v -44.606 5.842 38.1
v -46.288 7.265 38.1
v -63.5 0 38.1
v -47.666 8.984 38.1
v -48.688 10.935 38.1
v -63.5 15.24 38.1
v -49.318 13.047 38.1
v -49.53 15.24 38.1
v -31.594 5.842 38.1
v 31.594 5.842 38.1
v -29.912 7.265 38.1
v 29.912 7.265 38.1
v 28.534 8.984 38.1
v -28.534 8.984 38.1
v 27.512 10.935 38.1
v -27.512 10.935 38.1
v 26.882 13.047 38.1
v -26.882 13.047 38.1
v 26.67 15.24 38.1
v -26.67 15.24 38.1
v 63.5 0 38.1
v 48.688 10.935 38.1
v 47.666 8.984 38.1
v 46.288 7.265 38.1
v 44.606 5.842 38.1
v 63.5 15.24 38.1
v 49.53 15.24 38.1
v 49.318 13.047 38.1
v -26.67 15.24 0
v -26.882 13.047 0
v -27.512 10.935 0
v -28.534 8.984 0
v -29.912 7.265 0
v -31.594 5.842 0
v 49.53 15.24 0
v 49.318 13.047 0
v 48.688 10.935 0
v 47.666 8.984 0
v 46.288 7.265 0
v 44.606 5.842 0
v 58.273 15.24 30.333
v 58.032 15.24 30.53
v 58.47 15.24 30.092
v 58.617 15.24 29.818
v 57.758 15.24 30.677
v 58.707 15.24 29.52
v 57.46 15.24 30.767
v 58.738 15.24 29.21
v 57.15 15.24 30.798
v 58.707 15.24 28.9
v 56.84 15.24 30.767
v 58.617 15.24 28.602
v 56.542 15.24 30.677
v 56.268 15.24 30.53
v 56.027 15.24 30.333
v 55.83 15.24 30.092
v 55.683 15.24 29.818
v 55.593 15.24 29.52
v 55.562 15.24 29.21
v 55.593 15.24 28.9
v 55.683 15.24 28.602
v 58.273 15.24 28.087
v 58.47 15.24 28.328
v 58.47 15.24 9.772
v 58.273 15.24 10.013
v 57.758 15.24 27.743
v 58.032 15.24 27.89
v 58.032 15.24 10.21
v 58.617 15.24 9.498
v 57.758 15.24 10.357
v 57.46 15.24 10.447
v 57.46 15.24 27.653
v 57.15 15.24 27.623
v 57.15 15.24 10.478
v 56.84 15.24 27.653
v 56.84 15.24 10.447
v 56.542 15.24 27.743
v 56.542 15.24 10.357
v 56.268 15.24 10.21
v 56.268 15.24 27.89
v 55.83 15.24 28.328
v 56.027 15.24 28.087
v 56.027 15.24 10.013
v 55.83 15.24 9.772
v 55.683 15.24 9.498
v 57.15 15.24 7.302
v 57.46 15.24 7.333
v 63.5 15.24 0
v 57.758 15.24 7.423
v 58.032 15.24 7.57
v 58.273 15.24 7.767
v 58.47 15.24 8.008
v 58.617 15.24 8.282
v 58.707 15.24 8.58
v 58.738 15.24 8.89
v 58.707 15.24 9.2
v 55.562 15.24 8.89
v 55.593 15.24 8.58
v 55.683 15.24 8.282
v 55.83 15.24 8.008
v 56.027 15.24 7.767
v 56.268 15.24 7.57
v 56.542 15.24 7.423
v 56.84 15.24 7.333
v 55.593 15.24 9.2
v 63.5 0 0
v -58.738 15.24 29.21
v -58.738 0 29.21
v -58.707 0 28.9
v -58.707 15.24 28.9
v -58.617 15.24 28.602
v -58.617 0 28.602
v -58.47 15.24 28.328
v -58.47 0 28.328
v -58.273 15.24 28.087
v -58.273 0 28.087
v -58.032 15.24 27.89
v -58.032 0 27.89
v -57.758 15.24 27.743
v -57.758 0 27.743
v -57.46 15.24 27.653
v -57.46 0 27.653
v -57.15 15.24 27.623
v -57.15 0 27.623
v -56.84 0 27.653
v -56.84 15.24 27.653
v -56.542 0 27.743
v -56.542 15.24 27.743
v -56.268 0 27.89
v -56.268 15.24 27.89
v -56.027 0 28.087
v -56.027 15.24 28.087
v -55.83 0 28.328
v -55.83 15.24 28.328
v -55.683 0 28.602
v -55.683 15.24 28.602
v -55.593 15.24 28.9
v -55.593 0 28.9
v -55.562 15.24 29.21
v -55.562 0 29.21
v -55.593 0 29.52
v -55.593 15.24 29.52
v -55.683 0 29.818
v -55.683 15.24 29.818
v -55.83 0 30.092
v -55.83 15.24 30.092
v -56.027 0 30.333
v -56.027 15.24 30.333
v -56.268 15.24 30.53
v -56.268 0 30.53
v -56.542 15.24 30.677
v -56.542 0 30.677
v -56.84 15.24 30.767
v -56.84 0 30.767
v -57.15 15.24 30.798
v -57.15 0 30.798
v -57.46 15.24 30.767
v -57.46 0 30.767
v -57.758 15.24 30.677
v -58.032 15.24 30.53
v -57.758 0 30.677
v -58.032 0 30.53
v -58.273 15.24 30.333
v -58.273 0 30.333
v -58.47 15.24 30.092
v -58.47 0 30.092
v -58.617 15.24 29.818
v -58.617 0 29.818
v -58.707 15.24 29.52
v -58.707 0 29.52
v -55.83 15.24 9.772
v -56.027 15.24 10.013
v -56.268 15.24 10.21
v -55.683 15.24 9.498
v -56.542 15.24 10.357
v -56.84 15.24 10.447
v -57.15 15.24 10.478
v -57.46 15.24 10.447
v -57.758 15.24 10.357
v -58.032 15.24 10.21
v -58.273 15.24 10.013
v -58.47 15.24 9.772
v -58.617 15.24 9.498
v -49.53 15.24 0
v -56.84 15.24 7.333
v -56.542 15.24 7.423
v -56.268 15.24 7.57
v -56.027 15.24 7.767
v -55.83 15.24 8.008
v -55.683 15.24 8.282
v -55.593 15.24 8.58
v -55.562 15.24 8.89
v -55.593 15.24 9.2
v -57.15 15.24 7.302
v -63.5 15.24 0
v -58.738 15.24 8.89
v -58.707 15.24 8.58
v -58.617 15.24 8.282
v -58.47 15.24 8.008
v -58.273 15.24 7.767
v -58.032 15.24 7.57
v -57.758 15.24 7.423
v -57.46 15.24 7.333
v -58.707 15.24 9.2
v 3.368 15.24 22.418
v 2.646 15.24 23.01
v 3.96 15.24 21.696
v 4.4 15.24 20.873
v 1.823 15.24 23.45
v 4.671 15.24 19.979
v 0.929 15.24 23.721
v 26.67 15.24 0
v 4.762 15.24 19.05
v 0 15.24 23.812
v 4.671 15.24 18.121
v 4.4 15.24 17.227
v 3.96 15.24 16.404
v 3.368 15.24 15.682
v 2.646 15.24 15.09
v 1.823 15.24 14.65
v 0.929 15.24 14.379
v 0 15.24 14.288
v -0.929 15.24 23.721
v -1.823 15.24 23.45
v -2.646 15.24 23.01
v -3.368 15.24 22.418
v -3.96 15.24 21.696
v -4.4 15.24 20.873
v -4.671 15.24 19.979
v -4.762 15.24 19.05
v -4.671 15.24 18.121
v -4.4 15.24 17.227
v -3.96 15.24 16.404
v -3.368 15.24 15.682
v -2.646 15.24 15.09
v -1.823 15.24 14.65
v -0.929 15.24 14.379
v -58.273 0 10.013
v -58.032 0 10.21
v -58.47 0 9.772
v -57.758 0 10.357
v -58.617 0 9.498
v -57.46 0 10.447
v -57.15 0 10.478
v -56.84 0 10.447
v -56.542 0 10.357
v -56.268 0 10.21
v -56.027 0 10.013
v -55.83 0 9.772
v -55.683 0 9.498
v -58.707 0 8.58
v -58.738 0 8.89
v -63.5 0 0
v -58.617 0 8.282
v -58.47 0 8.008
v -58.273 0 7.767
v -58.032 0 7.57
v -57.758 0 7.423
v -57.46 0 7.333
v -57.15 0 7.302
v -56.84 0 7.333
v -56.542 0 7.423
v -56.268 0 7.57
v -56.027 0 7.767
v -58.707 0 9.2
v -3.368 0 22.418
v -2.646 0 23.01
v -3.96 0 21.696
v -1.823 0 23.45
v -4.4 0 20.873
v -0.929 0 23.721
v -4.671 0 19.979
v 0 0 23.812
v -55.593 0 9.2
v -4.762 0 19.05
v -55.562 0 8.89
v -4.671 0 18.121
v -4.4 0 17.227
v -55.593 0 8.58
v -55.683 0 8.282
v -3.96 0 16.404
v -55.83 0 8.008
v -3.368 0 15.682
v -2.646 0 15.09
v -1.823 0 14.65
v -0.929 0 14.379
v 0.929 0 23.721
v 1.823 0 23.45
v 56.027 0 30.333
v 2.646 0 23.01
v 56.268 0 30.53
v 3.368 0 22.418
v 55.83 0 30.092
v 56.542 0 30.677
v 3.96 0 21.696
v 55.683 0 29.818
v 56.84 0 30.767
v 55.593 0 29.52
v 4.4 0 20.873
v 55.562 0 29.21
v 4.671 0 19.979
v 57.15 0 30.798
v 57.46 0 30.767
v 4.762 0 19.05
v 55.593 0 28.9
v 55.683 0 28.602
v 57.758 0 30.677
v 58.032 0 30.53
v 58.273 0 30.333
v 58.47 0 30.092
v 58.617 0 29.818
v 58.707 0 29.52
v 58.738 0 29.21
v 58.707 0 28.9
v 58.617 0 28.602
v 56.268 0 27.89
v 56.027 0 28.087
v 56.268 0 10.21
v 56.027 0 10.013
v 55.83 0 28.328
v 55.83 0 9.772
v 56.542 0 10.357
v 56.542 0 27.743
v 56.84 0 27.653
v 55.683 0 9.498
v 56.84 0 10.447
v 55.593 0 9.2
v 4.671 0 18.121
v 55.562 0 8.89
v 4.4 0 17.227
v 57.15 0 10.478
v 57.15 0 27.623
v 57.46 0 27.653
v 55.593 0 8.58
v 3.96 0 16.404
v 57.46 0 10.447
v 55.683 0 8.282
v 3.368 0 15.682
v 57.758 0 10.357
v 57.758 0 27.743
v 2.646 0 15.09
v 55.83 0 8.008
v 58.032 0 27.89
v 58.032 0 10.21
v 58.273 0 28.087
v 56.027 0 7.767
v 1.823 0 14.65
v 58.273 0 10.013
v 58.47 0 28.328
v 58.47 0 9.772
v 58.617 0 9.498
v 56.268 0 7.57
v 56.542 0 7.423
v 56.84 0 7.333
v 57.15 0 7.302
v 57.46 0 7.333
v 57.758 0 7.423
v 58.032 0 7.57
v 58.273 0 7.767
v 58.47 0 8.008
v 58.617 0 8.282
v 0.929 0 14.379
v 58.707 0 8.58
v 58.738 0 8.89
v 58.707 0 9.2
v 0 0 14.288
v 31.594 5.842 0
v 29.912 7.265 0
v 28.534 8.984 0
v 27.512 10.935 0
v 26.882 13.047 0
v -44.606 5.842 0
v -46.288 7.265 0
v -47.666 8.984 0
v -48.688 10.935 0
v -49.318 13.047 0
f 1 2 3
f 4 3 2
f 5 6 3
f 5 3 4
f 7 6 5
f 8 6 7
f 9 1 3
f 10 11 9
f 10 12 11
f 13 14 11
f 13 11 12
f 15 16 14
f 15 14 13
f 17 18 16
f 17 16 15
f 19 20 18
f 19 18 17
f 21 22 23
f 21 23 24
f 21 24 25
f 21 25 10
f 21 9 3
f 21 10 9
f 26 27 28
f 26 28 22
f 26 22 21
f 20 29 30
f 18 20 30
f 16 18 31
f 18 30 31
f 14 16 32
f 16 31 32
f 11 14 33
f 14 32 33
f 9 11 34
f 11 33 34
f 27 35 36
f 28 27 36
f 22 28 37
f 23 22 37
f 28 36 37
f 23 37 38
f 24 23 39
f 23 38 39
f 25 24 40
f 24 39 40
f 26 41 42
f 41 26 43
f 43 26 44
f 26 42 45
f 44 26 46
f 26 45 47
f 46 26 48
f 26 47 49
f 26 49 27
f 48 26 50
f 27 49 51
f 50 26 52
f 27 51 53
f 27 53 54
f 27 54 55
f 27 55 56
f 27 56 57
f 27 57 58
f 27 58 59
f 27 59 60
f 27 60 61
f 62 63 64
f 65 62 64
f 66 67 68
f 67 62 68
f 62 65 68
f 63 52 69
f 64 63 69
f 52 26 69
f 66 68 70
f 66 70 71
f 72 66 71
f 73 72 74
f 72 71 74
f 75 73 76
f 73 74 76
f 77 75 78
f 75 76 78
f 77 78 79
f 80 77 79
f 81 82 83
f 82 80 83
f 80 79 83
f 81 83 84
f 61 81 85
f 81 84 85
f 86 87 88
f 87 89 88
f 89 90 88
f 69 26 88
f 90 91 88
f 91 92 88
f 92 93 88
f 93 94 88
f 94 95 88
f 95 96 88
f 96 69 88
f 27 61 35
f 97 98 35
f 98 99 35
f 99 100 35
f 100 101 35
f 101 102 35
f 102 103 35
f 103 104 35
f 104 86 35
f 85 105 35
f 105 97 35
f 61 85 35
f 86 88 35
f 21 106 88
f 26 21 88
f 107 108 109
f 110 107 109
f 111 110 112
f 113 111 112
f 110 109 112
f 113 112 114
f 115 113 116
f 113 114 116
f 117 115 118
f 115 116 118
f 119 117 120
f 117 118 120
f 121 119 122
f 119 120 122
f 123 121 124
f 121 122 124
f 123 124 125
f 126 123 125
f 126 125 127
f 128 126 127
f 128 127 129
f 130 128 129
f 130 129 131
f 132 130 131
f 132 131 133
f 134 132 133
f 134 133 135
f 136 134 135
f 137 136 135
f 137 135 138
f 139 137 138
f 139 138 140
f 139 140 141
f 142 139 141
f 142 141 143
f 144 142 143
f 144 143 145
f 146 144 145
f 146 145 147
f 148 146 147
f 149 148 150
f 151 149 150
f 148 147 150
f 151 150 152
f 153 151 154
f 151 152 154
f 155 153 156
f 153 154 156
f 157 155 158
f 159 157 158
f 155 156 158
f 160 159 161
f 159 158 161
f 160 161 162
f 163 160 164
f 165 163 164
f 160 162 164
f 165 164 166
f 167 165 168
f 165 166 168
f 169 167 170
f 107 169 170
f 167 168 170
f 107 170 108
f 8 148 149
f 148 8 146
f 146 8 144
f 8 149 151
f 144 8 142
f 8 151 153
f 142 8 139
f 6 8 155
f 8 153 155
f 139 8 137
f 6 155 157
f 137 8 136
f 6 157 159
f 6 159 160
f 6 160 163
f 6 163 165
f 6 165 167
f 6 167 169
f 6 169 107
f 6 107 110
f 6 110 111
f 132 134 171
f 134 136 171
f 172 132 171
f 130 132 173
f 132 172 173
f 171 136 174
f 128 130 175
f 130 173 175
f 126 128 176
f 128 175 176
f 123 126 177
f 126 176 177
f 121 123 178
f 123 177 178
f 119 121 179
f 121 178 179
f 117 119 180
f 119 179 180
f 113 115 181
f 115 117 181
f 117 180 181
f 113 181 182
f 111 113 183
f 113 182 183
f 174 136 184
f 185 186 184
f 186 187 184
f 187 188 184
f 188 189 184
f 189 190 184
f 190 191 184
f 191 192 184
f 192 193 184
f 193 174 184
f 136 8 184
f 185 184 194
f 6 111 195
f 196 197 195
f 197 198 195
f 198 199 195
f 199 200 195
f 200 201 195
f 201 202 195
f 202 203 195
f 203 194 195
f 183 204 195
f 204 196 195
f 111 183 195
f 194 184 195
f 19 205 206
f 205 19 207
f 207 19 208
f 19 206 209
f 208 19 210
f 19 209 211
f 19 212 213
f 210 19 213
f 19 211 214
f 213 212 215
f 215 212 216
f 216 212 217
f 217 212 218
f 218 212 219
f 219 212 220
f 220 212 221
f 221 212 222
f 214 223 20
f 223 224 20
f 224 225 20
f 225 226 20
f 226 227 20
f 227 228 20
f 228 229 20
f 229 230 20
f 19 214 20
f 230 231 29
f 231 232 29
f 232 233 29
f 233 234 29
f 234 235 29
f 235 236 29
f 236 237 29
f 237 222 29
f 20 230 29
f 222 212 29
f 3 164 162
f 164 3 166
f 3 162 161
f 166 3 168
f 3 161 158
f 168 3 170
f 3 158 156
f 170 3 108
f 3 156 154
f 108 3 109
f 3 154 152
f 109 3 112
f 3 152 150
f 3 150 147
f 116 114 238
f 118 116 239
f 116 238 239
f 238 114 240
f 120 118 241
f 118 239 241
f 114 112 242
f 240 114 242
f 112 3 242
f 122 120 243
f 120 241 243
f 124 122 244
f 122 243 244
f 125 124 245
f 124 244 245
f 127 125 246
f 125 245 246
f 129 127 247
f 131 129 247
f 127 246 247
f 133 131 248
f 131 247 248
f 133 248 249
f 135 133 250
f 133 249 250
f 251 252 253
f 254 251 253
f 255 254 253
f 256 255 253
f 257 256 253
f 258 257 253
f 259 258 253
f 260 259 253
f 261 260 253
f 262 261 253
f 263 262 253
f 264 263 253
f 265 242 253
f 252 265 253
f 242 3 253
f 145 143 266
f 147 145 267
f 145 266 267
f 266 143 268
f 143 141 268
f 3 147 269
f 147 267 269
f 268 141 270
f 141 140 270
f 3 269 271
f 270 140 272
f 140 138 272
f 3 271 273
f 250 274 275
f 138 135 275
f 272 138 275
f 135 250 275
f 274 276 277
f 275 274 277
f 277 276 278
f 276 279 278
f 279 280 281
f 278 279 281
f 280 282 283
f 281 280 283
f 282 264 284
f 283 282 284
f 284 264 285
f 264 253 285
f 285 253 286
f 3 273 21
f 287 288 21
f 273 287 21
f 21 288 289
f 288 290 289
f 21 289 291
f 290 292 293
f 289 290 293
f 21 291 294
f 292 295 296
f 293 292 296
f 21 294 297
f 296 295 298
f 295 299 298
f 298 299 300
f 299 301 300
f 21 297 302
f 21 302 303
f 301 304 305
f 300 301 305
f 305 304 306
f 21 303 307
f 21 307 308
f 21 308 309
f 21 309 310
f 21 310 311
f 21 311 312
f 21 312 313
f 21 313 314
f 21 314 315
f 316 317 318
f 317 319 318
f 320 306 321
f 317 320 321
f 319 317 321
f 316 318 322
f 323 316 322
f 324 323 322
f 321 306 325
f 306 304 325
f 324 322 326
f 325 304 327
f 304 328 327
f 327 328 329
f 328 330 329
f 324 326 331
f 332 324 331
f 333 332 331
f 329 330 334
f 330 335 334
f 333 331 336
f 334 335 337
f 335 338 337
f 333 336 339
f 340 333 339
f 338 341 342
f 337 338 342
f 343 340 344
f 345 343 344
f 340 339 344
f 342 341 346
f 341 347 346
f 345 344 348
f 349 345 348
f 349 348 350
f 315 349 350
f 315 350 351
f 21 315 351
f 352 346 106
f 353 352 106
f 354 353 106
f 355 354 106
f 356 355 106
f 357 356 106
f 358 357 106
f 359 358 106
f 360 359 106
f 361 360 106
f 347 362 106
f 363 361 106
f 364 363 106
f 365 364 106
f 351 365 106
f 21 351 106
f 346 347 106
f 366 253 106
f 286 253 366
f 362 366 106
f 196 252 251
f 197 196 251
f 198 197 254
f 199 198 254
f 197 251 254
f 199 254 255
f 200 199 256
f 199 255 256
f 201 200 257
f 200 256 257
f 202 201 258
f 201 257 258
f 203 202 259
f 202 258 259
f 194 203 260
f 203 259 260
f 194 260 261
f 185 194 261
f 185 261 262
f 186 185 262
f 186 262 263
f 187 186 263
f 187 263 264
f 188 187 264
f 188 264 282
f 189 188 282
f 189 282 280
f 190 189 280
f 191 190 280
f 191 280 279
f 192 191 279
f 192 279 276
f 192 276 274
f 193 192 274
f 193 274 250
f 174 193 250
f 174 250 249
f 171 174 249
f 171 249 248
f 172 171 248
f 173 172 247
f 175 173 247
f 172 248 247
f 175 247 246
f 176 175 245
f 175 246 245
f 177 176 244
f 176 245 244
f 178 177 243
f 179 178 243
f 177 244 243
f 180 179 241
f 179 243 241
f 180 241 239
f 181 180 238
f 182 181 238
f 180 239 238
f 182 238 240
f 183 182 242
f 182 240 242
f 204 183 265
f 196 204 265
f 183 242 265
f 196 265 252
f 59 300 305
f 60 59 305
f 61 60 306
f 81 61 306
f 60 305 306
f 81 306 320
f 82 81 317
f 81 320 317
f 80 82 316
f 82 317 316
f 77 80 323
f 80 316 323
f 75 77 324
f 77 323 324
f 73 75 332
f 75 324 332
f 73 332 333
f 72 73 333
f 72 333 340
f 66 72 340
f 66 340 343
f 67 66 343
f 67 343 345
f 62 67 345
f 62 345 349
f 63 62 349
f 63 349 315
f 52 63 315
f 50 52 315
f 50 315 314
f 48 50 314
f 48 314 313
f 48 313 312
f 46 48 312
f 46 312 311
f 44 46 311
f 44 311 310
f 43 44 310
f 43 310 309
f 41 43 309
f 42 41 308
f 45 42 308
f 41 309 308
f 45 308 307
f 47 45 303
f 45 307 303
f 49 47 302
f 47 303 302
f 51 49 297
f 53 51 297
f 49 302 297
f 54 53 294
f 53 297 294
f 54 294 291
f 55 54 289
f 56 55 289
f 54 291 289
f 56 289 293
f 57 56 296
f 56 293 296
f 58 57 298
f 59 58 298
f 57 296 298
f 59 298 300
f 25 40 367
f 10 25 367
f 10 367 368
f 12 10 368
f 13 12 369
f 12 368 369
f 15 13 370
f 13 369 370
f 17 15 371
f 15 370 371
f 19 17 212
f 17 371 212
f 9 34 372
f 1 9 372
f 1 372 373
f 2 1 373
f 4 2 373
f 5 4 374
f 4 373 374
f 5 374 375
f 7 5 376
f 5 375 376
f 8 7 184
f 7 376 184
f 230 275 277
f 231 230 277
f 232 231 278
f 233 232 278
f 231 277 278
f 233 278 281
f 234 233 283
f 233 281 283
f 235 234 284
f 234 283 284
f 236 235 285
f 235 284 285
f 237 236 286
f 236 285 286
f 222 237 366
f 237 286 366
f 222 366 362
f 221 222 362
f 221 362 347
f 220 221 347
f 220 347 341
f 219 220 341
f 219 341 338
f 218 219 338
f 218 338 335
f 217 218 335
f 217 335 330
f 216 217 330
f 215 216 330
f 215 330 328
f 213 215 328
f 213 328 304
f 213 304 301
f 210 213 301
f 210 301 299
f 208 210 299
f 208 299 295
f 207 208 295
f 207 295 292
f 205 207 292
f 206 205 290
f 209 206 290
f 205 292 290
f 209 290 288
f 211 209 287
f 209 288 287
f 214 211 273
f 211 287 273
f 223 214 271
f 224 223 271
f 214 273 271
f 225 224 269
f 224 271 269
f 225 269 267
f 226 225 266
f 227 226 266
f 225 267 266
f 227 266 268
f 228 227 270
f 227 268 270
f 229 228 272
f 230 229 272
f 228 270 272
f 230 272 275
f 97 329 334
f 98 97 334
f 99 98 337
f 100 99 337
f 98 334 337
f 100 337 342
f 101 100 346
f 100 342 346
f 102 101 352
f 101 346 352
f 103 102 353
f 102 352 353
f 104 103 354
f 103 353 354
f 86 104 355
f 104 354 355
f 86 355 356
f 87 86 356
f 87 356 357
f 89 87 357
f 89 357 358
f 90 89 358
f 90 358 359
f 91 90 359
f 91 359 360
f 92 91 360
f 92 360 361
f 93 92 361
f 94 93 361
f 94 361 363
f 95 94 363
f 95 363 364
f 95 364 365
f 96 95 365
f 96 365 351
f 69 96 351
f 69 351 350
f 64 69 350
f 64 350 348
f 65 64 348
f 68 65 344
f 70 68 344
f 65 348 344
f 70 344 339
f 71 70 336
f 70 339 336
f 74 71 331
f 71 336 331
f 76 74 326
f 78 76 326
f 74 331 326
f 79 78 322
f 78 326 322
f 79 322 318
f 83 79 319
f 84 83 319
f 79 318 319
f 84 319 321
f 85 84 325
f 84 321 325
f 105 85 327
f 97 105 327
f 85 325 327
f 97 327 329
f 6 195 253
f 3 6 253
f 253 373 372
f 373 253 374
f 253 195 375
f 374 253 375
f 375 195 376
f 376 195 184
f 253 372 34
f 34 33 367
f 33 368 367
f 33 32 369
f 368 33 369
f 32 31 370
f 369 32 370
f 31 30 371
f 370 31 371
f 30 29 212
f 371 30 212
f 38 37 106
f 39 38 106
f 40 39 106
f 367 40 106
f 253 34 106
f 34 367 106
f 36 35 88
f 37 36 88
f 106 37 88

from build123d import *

# Parameters (mm, degrees)
BOSS_EXTRUDE1_DEPTH  = 38.1
HOLE1_D              = 9.525
HOLE1_DEPTH          = 101.6
HOLE2_D              = 3.175
HOLE2_DEPTH          = 101.6
LPATTERN1_COUNT      = 2
LPATTERN1_PITCH      = 20.32
LPATTERN1_COUNT_DIR2 = 2
LPATTERN1_PITCH_DIR2 = 114.3


with BuildPart() as part:
    # Sketch1 → Boss-Extrude1 (new body)
    with BuildSketch(Plane.XY):
        with BuildLine():
            Line((-63.5, 0), (63.5, 0))
            Line((63.5, 0), (63.5, 15.24))
            Line((63.5, 15.24), (49.53, 15.24))
            ThreePointArc((49.53, 15.24), (48.224317592, 9.934993562), (44.605574225, 5.842))
            Line((44.605574225, 5.842), (31.594425775, 5.842))
            ThreePointArc((31.594425775, 5.842), (27.975682408, 9.934993562), (26.67, 15.24))
            Line((26.67, 15.24), (-26.67, 15.24))
            ThreePointArc((-26.67, 15.24), (-27.975682408, 9.934993562), (-31.594425775, 5.842))
            Line((-31.594425775, 5.842), (-44.605574225, 5.842))
            ThreePointArc((-44.605574225, 5.842), (-48.224317592, 9.934993562), (-49.53, 15.24))
            Line((-49.53, 15.24), (-63.5, 15.24))
            Line((-63.5, 15.24), (-63.5, 0))
        make_face()
    extrude(amount=BOSS_EXTRUDE1_DEPTH)

    # Hole1
    with Locations(Plane(origin=(0, 15.24, 0), x_dir=(1, 0, 0), z_dir=(0, 1, 0))):
        with Locations((0, -19.05)):
            Hole(HOLE1_D / 2, depth=HOLE1_DEPTH)

    # Hole2
    with Locations(Plane(origin=(0, 15.24, 0), x_dir=(1, 0, 0), z_dir=(0, 1, 0))):
        with Locations((-57.15, -8.89)):
            hole2 = Hole(HOLE2_D / 2, depth=HOLE2_DEPTH)

    # LPattern1: Hole2 2 × 2
    with Locations(*[(j * LPATTERN1_PITCH_DIR2, 0, i * LPATTERN1_PITCH) for i in range(LPATTERN1_COUNT) for j in range(LPATTERN1_COUNT_DIR2) if (i, j) != (0, 0)]):
        add(hole2, mode=Mode.SUBTRACT)


solid = part.part
